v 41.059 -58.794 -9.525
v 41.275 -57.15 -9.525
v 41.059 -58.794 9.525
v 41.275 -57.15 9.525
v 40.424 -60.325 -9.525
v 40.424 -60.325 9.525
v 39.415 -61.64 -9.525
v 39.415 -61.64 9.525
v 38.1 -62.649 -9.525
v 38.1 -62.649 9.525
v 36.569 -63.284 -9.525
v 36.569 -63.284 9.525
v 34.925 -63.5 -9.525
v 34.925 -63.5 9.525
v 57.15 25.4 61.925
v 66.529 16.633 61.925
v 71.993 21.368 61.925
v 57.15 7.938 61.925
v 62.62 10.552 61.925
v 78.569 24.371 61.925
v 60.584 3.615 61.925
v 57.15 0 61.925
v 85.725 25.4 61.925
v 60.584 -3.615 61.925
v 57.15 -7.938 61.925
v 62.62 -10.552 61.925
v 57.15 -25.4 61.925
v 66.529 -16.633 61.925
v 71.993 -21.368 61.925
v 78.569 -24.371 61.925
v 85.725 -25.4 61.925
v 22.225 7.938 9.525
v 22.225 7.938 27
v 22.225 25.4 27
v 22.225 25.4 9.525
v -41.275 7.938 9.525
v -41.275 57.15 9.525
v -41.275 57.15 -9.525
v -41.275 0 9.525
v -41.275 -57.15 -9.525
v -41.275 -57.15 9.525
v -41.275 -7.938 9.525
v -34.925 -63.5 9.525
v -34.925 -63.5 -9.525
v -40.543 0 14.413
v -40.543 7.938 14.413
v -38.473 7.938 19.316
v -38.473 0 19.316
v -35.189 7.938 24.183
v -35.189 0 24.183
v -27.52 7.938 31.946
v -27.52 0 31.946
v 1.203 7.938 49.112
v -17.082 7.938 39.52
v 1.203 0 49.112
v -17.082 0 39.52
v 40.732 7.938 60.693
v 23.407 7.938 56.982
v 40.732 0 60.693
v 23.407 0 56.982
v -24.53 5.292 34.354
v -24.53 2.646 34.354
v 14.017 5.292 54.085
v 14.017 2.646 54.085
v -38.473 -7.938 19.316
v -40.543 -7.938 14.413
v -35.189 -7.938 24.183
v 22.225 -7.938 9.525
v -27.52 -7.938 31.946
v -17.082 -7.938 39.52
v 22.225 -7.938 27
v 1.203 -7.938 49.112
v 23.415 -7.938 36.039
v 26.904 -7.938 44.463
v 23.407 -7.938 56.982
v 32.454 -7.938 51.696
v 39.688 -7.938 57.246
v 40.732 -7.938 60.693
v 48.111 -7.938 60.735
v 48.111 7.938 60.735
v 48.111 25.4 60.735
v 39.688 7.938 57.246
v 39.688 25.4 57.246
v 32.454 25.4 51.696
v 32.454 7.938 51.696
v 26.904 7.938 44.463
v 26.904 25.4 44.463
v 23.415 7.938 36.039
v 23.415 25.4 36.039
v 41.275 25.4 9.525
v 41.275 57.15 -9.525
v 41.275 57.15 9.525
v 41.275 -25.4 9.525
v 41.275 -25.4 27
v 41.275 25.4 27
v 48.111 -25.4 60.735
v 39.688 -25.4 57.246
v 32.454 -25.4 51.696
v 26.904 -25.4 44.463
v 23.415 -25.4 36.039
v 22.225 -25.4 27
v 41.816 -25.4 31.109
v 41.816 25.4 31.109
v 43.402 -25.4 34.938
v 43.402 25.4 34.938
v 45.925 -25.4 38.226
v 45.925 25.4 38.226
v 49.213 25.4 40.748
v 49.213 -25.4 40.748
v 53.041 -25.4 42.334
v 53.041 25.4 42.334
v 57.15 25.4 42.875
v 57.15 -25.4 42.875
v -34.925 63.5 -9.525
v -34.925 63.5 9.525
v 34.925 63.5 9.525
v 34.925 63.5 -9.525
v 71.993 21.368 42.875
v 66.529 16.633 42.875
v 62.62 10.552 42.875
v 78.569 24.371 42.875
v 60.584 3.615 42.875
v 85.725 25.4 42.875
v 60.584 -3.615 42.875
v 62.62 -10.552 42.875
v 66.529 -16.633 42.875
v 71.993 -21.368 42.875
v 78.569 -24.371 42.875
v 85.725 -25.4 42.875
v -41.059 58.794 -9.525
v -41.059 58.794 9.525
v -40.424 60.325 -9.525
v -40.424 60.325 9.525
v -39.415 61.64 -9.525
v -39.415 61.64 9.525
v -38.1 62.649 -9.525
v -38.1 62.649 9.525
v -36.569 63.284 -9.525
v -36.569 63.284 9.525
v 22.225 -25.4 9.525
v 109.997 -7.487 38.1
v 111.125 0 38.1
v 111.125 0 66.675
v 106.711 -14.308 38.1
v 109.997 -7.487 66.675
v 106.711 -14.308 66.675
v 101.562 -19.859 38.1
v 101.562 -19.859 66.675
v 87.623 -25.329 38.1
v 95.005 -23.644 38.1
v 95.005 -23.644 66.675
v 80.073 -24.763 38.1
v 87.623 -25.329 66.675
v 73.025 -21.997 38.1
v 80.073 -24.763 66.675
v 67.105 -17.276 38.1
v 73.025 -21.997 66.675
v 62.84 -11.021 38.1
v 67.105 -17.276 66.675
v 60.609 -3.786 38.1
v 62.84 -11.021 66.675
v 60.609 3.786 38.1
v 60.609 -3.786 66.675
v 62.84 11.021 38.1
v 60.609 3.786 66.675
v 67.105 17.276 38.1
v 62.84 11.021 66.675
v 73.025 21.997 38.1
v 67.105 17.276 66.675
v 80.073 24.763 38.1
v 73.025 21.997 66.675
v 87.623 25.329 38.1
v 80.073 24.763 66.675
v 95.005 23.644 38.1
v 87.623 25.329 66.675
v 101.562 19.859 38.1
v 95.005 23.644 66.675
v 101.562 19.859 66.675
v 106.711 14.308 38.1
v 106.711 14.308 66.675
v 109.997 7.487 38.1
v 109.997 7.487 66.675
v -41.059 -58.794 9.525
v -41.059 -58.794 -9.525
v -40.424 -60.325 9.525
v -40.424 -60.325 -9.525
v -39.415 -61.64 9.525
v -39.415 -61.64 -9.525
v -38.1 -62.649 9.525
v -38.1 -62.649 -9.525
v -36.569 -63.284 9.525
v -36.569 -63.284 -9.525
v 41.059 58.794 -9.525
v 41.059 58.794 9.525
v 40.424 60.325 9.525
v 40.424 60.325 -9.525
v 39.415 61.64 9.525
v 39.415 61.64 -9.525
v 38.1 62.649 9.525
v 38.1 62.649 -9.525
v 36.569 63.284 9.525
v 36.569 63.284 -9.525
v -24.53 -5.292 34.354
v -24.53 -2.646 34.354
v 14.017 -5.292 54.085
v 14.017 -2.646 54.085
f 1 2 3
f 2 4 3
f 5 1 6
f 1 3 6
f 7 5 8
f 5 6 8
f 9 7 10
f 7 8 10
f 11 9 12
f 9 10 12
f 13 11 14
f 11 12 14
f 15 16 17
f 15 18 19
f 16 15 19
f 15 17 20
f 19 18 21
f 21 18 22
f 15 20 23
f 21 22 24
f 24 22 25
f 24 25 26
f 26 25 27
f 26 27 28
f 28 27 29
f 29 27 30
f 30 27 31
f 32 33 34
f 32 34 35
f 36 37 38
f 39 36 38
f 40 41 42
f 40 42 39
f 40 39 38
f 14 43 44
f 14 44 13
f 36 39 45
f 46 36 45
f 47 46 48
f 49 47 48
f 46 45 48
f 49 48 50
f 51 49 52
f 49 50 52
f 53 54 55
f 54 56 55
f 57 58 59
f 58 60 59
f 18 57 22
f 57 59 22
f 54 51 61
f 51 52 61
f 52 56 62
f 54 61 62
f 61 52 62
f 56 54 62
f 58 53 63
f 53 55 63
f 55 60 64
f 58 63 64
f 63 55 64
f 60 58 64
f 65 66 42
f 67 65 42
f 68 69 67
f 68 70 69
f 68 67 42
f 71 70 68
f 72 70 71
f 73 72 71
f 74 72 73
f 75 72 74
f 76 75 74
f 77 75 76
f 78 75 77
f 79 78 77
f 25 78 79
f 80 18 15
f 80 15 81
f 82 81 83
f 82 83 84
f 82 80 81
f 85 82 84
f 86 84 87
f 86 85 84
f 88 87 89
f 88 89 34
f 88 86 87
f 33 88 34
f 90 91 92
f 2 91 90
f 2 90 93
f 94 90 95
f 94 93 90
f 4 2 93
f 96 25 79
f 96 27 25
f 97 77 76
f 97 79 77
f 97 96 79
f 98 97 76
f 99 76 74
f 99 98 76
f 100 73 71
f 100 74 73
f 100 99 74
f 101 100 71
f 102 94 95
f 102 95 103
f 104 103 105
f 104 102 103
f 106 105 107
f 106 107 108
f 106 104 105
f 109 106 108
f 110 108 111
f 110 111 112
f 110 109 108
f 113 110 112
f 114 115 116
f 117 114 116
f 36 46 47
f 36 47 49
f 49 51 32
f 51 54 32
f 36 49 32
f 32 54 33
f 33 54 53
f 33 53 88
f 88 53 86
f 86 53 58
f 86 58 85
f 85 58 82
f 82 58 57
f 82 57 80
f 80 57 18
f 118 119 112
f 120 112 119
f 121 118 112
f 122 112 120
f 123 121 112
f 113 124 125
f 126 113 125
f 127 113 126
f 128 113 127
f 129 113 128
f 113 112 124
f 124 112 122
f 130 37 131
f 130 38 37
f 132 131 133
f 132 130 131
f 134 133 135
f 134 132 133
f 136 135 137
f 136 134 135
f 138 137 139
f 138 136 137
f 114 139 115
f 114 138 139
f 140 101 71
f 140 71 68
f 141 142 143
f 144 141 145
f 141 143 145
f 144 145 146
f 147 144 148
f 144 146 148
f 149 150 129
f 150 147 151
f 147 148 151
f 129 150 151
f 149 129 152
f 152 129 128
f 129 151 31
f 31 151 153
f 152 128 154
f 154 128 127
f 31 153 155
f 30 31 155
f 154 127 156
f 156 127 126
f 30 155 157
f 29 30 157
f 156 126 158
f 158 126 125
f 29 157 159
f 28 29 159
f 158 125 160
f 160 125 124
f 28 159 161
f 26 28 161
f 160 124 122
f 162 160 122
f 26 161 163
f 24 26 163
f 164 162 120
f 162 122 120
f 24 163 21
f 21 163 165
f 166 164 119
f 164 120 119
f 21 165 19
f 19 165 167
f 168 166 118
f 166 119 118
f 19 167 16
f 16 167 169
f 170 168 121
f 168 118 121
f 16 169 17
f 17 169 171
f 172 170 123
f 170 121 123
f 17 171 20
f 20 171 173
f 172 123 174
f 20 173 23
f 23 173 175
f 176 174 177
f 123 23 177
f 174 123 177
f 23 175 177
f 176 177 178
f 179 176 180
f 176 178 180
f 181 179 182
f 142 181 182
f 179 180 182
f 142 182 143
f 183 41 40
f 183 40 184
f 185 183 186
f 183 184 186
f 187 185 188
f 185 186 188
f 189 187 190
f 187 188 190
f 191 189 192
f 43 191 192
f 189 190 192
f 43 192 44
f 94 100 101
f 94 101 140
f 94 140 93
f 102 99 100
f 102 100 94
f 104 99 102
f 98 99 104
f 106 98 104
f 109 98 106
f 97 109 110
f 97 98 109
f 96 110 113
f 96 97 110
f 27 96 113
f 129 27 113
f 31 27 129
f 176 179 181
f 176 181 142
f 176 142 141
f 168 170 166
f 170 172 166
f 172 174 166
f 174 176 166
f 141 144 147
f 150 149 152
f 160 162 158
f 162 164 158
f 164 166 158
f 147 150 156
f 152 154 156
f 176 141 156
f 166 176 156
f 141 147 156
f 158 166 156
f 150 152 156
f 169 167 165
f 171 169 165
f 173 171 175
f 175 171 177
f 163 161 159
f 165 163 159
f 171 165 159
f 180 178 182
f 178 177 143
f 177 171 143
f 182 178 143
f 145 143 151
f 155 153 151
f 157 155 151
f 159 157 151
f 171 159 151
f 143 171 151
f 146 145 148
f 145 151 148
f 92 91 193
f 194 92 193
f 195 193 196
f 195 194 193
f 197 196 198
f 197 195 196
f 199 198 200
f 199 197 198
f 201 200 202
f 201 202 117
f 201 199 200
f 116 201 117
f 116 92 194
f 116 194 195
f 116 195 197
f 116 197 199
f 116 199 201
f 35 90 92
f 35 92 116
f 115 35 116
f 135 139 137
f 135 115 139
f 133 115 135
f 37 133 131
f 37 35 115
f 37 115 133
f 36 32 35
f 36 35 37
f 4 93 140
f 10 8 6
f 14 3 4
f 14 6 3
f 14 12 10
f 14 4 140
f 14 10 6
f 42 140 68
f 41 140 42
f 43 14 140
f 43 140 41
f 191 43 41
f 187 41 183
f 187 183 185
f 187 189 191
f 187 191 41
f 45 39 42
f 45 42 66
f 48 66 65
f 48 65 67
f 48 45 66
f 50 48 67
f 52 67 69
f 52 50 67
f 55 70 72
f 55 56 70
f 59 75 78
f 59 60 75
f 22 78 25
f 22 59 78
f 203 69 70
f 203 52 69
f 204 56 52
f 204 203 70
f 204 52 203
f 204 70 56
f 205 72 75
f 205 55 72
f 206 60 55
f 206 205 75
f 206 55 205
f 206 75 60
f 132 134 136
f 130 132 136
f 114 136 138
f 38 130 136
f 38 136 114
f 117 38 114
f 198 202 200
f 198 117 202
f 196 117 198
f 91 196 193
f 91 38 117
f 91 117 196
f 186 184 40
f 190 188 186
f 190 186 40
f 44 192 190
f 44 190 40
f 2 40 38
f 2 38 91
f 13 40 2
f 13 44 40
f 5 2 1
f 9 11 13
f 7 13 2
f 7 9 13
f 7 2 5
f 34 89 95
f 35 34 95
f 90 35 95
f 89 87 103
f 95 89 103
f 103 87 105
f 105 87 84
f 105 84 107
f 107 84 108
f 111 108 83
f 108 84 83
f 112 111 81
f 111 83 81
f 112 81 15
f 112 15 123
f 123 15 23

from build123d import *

# Parameters (mm, degrees)
F1_DEPTH = 63.5
F2_DEPTH = 25.4
F3_DEPTH = 7.9375
F0_W     = 25.4
F0_H     = 19.05
F4_DEPTH = 25.4
F6_R     = 6.35


with BuildPart() as f1:
    # F0 (on Front) → F1 (new body, symmetric)
    with BuildSketch(Plane.XZ):
        Polygon((41.275, -9.525), (41.275, 9.525), (22.225, 9.525), (-41.275, 9.525), (-41.275, -9.525), align=None)
    extrude(amount=F1_DEPTH, both=True)

    # F0 (on Front) → F2 (join, symmetric)
    with BuildSketch(Plane.XZ):
        with BuildLine():
            Line((22.225, 9.525), (41.275, 9.525))
            Line((41.275, 9.525), (41.275, 27.0002))
            ThreePointArc((41.275, 27.0002), (45.9246798487, 38.2255201513), (57.15, 42.8752))
            Line((57.15, 42.8752), (60.325, 42.8752))
            Line((60.325, 42.8752), (60.325, 61.9252))
            Line((60.325, 61.9252), (57.15, 61.9252))
            ThreePointArc((57.15, 61.9252), (32.4542956671, 51.6959043329), (22.225, 27.0002))
            Line((22.225, 27.0002), (22.225, 9.525))
        make_face()
    extrude(amount=F2_DEPTH, both=True)

    # F0 (on Front) → F3 (join, symmetric)
    with BuildSketch(Plane.XZ):
        with BuildLine():
            Line((-41.275, 9.525), (22.225, 9.525))
            Line((22.225, 9.525), (22.225, 27.0002))
            ThreePointArc((22.225, 27.0002), (32.4542956671, 51.6959043329), (57.15, 61.9252))
            add(Edge.make_bspline(
                [(-41.275, 9.525), (-41.1688275635, 34.6403568983), (17.4624975771, 62.293600291), (57.15, 61.9252)],
                knots=[0, 0, 0, 0, 111.5045361635, 111.5045361635, 111.5045361635, 111.5045361635], degree=3))
        make_face()
    extrude(amount=F3_DEPTH, both=True)

    # F0 (on Front) → F4 (join, symmetric)
    with BuildSketch(Plane.XZ):
        with Locations((73.025, 52.4002)):
            Rectangle(F0_W, F0_H)
    extrude(amount=F4_DEPTH, both=True)

    # F0 (on Front) → F5 (revolve)
    with BuildSketch(Plane.XZ):
        Polygon((85.725, 61.9252), (85.725, 42.8752), (85.725, 38.1), (111.125, 38.1), (111.125, 66.675), (85.725, 66.675), align=None)
    revolve(axis=Axis((85.725, 0, 52.3875), (0, 0, -1)))

    # F6
    f6_edges = [f1.edges().sort_by_distance(p)[0] for p in [
        (41.275, -63.5, 0),
        (-41.275, -63.5, 0),
        (41.275, 63.5, 0),
        (-41.275, 63.5, 0),
    ]]
    fillet(f6_edges, radius=F6_R)


solid = f1.part
